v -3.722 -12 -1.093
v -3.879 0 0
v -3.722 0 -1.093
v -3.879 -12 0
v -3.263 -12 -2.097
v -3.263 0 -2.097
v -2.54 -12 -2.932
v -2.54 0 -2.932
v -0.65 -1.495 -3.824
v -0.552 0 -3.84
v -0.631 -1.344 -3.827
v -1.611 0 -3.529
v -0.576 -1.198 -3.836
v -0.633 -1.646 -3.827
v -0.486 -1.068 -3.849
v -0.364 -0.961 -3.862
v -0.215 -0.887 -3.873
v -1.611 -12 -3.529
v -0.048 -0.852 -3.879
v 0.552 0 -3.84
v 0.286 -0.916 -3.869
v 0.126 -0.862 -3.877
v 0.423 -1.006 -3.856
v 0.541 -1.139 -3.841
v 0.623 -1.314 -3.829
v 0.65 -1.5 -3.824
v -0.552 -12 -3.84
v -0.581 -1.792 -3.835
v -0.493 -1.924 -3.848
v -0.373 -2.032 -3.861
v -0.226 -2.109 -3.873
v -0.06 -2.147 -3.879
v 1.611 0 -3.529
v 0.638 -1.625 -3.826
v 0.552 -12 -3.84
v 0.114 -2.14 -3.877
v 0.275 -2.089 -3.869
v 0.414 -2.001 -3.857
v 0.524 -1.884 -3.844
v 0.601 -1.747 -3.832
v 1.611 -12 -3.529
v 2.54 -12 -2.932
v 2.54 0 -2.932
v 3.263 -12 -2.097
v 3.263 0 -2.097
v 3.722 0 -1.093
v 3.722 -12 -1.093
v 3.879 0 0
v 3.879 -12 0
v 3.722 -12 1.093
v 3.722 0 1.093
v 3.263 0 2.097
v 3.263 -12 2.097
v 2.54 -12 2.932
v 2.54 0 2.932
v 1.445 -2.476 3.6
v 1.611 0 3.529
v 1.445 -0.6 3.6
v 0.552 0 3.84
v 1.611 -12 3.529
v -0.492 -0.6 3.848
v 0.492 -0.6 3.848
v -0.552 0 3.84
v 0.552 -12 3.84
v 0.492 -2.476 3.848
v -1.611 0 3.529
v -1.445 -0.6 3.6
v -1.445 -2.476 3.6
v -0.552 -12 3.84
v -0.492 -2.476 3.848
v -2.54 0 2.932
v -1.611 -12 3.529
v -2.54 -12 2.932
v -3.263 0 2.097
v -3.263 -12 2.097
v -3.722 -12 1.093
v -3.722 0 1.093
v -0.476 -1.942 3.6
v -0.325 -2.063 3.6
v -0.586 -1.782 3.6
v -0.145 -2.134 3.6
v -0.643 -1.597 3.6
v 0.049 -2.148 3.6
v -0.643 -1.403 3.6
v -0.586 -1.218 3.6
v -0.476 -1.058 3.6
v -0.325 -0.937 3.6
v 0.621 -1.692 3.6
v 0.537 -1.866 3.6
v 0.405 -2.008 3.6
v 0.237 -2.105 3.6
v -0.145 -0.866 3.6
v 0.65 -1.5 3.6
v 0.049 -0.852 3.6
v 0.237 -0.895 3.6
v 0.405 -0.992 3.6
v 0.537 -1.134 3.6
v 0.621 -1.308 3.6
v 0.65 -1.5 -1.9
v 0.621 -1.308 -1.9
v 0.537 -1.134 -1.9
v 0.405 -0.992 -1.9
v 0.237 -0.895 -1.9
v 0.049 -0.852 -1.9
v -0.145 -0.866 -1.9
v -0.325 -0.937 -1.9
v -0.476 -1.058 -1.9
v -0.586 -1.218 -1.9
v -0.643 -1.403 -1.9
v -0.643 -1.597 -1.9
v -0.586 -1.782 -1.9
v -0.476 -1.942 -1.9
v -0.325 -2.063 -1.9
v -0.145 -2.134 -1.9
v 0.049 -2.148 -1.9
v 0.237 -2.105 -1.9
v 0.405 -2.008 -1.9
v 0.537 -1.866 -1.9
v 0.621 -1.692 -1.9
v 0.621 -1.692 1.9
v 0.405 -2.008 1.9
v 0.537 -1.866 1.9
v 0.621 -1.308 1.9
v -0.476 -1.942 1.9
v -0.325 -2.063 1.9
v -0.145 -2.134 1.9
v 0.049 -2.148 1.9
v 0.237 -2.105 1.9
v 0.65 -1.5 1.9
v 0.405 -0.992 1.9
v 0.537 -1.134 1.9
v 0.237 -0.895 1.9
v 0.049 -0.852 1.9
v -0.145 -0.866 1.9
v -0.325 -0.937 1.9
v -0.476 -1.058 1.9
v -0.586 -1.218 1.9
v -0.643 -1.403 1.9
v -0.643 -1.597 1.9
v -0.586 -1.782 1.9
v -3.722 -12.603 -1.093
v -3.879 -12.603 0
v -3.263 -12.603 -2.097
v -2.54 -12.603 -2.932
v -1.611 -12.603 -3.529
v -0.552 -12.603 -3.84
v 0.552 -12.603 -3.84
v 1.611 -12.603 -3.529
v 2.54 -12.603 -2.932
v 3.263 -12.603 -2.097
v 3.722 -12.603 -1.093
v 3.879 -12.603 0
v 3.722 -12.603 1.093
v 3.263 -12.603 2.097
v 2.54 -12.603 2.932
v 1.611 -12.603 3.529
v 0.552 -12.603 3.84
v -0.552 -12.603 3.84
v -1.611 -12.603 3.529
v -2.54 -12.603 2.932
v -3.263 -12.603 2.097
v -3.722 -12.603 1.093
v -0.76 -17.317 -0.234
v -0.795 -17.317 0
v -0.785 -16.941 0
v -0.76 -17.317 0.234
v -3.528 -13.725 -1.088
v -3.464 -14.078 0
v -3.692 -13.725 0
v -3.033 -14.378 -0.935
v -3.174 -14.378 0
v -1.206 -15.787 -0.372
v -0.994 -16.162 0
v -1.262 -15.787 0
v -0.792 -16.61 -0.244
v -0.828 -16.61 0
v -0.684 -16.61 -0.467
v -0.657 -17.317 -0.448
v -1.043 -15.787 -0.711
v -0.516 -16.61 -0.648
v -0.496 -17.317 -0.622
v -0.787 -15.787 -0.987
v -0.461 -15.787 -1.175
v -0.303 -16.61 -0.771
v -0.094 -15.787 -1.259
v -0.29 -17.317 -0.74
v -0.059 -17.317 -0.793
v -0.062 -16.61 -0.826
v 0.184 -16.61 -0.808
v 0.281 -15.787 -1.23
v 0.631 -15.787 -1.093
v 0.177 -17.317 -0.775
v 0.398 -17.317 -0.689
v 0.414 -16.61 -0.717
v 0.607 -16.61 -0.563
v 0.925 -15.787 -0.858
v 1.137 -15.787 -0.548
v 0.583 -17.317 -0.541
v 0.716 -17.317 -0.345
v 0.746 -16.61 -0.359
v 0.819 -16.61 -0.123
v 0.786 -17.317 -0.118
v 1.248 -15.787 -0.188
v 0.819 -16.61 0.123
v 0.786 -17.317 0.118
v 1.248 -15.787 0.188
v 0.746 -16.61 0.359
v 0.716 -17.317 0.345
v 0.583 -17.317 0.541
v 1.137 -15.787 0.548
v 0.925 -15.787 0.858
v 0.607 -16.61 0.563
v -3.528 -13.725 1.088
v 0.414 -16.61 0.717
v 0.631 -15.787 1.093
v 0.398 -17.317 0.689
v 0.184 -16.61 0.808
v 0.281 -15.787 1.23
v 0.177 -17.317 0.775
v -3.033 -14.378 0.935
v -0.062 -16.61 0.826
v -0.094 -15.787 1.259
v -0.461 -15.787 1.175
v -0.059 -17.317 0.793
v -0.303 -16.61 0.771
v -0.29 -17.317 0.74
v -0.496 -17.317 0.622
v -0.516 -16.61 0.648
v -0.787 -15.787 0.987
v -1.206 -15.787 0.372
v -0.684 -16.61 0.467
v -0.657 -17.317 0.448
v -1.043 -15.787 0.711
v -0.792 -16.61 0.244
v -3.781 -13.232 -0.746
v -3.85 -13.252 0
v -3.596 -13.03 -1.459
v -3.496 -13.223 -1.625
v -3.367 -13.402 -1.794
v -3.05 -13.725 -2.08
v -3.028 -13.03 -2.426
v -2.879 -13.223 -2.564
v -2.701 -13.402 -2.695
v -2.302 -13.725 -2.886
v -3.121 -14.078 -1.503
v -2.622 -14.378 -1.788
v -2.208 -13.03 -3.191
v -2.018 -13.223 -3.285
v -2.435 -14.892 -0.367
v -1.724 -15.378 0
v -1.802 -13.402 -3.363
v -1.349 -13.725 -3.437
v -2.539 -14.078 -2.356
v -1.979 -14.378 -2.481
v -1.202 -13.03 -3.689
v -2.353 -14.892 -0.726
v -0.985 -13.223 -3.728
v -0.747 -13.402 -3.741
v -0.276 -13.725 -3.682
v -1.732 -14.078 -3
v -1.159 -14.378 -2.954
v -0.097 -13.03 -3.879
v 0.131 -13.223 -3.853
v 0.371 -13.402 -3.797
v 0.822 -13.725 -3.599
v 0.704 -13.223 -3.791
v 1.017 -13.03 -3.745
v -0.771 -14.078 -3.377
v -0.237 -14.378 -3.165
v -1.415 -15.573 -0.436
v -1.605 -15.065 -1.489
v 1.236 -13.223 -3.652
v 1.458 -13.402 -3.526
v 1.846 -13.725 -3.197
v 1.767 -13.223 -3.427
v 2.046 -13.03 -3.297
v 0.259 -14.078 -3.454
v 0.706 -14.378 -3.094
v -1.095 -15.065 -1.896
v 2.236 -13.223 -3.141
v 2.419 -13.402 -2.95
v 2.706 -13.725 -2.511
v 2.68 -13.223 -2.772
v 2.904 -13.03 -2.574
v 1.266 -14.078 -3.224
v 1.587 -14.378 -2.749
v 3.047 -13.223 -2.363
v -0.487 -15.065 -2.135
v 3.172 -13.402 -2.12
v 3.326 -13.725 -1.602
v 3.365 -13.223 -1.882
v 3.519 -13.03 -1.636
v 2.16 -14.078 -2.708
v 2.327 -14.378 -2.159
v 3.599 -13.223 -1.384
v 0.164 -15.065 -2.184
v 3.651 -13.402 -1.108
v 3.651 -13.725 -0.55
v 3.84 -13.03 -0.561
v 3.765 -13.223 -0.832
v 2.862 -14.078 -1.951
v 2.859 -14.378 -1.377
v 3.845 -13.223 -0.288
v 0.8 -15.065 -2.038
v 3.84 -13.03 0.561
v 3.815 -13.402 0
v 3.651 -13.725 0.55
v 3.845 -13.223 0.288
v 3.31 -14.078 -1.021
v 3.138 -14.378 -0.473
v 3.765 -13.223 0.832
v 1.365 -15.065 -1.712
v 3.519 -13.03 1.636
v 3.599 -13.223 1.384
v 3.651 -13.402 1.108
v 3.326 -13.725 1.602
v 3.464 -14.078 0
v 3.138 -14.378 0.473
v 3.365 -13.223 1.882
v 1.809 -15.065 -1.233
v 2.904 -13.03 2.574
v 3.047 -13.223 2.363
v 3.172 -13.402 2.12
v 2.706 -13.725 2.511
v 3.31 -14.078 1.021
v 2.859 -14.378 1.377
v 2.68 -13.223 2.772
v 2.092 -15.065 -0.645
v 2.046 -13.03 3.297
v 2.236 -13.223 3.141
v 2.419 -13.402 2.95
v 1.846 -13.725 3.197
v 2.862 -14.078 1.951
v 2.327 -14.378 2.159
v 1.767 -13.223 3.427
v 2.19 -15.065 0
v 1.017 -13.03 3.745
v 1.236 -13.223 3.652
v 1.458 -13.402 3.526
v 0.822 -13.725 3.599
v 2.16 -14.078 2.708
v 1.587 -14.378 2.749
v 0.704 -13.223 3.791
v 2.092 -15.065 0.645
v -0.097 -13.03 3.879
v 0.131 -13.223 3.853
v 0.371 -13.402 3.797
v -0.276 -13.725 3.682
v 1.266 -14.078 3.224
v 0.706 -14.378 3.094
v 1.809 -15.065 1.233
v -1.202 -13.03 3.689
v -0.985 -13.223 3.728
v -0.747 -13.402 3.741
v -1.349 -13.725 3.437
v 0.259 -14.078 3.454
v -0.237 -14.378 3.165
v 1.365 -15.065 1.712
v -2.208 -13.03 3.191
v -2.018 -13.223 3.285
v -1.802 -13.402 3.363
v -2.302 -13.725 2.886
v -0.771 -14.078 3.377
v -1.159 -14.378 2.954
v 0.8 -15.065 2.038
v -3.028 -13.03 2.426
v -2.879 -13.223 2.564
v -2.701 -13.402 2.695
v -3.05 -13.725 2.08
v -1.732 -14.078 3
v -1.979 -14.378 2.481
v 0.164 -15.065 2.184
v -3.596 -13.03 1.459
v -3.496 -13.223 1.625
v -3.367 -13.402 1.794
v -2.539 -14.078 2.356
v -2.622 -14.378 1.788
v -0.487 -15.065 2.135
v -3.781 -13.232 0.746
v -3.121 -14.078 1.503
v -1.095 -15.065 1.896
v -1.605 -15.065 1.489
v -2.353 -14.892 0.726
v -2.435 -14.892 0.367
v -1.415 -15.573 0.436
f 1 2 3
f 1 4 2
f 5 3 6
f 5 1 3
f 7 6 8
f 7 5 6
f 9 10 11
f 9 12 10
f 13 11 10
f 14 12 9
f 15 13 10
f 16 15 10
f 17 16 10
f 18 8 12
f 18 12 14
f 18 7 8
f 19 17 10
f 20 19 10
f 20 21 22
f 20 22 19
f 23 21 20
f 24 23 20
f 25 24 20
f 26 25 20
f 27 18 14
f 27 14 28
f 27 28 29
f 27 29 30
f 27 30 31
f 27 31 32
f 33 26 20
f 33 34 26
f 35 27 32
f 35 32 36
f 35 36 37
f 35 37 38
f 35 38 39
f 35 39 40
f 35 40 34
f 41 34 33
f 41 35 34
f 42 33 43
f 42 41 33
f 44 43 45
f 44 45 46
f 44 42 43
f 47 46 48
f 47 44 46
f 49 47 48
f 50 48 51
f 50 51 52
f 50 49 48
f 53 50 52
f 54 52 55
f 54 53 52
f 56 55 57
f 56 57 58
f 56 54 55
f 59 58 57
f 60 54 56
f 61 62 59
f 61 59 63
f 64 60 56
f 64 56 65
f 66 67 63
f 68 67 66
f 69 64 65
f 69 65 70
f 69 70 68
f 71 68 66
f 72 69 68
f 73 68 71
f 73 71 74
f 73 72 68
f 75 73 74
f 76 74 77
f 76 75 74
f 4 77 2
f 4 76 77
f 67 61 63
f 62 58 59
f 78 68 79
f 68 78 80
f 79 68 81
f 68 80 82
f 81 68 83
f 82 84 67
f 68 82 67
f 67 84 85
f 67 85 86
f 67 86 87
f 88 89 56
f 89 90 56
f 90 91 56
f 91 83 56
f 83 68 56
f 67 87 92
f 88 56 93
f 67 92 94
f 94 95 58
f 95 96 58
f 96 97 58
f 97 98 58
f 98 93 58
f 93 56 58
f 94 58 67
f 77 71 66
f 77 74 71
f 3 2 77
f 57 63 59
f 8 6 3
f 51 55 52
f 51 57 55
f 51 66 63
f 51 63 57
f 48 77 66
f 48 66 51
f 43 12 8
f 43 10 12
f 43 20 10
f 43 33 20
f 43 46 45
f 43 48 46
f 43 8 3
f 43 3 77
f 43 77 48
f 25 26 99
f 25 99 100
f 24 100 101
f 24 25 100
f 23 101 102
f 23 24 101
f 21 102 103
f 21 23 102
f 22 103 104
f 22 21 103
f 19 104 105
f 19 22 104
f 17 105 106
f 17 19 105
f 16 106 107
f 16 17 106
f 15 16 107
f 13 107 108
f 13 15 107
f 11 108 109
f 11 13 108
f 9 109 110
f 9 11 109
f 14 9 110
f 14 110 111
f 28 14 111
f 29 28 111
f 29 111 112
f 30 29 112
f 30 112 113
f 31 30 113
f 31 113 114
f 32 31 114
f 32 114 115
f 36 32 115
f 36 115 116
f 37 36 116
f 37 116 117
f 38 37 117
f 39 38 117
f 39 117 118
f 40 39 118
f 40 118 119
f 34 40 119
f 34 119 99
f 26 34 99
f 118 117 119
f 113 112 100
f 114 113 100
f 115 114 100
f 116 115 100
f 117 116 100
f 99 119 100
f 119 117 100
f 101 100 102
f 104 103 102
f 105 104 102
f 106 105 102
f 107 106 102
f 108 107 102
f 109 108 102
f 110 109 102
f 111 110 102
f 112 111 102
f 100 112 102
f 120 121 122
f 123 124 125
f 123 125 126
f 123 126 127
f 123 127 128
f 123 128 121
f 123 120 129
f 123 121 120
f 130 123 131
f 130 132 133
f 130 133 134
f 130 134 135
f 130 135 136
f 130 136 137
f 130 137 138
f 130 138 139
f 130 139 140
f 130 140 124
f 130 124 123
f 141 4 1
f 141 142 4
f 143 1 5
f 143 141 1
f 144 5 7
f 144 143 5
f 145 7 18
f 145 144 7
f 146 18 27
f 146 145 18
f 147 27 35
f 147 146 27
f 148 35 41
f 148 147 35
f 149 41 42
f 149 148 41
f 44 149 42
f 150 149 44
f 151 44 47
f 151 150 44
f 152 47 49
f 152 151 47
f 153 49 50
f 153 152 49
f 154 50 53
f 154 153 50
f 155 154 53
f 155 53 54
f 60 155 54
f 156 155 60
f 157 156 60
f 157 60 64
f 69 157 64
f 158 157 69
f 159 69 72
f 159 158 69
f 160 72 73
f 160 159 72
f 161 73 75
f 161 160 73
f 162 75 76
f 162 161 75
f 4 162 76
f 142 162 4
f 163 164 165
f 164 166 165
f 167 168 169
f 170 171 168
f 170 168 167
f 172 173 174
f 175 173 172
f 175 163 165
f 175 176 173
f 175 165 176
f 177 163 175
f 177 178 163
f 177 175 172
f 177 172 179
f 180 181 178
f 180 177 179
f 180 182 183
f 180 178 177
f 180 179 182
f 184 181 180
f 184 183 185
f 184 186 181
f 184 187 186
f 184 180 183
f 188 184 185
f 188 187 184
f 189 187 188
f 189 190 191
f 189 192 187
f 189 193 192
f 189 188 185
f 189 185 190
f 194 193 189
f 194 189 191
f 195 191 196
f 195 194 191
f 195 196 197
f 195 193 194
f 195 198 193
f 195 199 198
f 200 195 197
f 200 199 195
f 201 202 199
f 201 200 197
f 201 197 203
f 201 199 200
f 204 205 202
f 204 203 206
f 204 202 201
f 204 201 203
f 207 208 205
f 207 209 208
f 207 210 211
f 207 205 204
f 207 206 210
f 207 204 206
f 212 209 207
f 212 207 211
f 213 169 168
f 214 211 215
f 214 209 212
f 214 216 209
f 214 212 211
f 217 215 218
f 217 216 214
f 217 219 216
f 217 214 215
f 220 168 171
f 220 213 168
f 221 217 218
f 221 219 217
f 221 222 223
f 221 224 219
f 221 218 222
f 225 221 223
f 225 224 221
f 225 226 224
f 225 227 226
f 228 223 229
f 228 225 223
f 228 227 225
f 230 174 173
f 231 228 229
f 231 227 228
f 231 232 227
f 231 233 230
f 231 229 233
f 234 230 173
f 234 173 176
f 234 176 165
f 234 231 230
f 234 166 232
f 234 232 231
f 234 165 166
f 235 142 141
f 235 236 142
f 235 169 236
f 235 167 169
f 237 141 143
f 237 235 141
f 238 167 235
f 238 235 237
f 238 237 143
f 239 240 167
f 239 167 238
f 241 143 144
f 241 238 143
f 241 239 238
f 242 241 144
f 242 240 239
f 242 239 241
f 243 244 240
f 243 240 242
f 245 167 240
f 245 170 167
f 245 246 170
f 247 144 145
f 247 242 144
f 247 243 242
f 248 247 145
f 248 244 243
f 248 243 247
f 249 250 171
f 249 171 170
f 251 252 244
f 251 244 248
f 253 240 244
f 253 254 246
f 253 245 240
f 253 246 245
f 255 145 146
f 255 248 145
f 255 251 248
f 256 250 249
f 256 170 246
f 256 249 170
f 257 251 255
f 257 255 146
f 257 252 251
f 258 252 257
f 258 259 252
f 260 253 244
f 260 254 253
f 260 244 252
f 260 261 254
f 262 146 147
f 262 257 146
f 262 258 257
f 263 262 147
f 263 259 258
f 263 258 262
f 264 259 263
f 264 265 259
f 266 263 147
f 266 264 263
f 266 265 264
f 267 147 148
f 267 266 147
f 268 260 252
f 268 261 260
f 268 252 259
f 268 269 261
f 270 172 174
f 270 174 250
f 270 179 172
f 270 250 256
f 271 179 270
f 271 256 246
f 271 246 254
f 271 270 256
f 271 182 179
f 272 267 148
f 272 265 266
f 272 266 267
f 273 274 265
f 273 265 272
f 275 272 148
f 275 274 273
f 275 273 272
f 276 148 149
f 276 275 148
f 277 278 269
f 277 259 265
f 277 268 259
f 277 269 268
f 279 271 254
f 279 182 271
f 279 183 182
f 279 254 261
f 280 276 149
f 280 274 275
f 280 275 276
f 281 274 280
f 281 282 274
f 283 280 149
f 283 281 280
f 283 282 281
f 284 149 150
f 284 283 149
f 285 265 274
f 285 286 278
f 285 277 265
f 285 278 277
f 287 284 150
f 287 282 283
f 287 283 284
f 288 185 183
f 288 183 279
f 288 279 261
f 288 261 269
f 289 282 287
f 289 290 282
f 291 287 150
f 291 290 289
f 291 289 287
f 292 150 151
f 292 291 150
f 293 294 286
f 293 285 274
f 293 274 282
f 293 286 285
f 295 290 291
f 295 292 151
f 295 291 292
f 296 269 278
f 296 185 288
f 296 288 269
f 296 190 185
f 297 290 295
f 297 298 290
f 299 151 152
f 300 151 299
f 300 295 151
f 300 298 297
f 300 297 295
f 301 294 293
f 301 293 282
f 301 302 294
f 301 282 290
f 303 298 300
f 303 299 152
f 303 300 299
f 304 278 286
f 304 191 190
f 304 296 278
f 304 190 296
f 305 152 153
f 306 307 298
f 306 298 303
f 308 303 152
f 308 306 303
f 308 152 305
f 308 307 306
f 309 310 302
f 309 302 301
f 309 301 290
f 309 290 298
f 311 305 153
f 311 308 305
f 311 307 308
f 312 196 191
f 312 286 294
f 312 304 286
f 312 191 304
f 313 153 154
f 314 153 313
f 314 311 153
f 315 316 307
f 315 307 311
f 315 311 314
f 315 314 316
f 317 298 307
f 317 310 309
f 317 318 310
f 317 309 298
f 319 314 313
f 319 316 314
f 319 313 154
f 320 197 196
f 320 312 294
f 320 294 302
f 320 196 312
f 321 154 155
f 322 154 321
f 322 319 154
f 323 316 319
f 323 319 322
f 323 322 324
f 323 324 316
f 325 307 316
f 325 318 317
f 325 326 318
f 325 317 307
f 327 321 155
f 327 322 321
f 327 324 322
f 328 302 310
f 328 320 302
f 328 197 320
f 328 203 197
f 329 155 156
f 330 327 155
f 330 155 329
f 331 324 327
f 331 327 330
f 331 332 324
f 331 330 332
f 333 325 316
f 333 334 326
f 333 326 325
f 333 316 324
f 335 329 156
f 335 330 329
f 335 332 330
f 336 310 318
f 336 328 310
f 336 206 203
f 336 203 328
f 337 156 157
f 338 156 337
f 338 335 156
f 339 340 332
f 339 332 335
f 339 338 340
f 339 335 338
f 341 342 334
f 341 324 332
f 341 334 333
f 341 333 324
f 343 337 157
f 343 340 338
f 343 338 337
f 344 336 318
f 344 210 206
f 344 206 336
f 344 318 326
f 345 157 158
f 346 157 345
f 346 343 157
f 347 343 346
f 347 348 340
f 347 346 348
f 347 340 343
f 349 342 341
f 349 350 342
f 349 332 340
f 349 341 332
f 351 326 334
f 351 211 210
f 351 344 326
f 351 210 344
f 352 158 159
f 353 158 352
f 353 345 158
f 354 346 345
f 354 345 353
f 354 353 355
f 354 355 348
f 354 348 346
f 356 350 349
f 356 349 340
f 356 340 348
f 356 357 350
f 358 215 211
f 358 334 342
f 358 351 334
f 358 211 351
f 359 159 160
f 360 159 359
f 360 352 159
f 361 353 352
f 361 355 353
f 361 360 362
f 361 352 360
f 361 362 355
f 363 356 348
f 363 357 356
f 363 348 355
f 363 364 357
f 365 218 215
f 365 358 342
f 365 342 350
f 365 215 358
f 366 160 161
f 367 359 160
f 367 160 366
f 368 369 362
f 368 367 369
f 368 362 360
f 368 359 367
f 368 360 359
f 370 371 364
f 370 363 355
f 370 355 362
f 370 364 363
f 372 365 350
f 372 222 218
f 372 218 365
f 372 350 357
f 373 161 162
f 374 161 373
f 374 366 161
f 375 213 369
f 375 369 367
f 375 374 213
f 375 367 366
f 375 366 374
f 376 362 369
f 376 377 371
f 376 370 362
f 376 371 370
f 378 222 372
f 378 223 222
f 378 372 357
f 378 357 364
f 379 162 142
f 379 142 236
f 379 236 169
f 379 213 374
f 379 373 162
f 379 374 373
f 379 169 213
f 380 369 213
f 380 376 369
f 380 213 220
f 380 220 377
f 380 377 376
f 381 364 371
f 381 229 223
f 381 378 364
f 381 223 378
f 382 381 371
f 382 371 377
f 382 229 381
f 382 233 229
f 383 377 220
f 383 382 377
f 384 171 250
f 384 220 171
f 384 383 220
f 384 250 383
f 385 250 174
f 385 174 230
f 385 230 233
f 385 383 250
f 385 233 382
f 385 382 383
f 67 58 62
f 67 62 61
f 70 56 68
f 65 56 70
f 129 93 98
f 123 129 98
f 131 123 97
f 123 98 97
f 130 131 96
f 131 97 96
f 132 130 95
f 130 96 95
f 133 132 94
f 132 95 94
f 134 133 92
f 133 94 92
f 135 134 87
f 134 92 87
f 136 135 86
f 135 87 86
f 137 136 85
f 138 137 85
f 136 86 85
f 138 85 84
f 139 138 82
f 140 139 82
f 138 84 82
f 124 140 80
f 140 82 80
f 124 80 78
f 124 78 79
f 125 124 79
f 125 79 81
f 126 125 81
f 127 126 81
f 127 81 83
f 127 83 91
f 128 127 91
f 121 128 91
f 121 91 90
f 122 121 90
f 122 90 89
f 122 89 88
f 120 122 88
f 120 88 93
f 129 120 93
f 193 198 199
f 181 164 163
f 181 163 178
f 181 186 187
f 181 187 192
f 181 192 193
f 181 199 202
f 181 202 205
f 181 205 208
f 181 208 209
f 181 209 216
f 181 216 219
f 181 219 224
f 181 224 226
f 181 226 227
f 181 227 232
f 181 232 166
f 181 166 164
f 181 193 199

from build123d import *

# Parameters (mm, degrees)
SKETCH3_R               = 0.65
CUT_EXTRUDE1_DEPTH      = 2
CUT_EXTRUDE2_START      = 2
SKETCH4_R               = 0.65
CUT_EXTRUDE2_DEPTH      = 2
CUT_EXTRUDE4_DEPTH      = 5
CUT_EXTRUDE4_DEPTH_BACK = 5
SKETCH6_W               = 0.570635025
SKETCH6_H               = 1.87642035


with BuildPart() as part:
    # Sketch2 → Revolve1 (revolve)
    with BuildSketch(Plane.XY):
        with BuildLine():
            Line((-3.879111396, 0), (-3.879111396, -12))
            Line((-3.879111396, -12), (-3.879111402, -12.602750297))
            add(Edge.make_bspline(
                [(-3.879111402, -12.602750297), (-4.096238593, -15.249180041), (-0.537349984, -14.727809099), (-0.795067133, -17.31657115)],
                knots=[0, 0, 0, 0, 1, 1, 1, 1], degree=3))
            Line((-0.795067133, -17.31657115), (0, -17.31657115))
            Line((0, -17.31657115), (0, 0))
            Line((0, 0), (-3.879111396, 0))
        make_face()
    revolve(axis=Axis((0, 0, 0), (0, -1, 0)))

    # Sketch3 → Cut-Extrude1 (cut)
    with BuildSketch(Plane.XY.offset(3.9)):
        with Locations((0, -1.5)):
            Circle(SKETCH3_R)
    extrude(amount=-CUT_EXTRUDE1_DEPTH, mode=Mode.SUBTRACT)

    # Sketch4 → Cut-Extrude2 (cut)
    with BuildSketch(Plane.XY.offset(-3.9).offset(CUT_EXTRUDE2_START)):
        with Locations((0, -1.5)):
            Circle(SKETCH4_R)
    extrude(amount=-CUT_EXTRUDE2_DEPTH, mode=Mode.SUBTRACT)

    # Sketch6 → Cut-Extrude4 (cut, two sides: drawn at the far end of the back side and taken through both)
    with BuildSketch(Plane(origin=(0, 0, 0), x_dir=(0, 0, -1), z_dir=(1, 0, 0)).offset(-CUT_EXTRUDE4_DEPTH_BACK)):
        with Locations((-3.8850644, -1.538047365)):
            Rectangle(SKETCH6_W, SKETCH6_H)
    extrude(amount=CUT_EXTRUDE4_DEPTH + CUT_EXTRUDE4_DEPTH_BACK, mode=Mode.SUBTRACT)


solid = part.part
